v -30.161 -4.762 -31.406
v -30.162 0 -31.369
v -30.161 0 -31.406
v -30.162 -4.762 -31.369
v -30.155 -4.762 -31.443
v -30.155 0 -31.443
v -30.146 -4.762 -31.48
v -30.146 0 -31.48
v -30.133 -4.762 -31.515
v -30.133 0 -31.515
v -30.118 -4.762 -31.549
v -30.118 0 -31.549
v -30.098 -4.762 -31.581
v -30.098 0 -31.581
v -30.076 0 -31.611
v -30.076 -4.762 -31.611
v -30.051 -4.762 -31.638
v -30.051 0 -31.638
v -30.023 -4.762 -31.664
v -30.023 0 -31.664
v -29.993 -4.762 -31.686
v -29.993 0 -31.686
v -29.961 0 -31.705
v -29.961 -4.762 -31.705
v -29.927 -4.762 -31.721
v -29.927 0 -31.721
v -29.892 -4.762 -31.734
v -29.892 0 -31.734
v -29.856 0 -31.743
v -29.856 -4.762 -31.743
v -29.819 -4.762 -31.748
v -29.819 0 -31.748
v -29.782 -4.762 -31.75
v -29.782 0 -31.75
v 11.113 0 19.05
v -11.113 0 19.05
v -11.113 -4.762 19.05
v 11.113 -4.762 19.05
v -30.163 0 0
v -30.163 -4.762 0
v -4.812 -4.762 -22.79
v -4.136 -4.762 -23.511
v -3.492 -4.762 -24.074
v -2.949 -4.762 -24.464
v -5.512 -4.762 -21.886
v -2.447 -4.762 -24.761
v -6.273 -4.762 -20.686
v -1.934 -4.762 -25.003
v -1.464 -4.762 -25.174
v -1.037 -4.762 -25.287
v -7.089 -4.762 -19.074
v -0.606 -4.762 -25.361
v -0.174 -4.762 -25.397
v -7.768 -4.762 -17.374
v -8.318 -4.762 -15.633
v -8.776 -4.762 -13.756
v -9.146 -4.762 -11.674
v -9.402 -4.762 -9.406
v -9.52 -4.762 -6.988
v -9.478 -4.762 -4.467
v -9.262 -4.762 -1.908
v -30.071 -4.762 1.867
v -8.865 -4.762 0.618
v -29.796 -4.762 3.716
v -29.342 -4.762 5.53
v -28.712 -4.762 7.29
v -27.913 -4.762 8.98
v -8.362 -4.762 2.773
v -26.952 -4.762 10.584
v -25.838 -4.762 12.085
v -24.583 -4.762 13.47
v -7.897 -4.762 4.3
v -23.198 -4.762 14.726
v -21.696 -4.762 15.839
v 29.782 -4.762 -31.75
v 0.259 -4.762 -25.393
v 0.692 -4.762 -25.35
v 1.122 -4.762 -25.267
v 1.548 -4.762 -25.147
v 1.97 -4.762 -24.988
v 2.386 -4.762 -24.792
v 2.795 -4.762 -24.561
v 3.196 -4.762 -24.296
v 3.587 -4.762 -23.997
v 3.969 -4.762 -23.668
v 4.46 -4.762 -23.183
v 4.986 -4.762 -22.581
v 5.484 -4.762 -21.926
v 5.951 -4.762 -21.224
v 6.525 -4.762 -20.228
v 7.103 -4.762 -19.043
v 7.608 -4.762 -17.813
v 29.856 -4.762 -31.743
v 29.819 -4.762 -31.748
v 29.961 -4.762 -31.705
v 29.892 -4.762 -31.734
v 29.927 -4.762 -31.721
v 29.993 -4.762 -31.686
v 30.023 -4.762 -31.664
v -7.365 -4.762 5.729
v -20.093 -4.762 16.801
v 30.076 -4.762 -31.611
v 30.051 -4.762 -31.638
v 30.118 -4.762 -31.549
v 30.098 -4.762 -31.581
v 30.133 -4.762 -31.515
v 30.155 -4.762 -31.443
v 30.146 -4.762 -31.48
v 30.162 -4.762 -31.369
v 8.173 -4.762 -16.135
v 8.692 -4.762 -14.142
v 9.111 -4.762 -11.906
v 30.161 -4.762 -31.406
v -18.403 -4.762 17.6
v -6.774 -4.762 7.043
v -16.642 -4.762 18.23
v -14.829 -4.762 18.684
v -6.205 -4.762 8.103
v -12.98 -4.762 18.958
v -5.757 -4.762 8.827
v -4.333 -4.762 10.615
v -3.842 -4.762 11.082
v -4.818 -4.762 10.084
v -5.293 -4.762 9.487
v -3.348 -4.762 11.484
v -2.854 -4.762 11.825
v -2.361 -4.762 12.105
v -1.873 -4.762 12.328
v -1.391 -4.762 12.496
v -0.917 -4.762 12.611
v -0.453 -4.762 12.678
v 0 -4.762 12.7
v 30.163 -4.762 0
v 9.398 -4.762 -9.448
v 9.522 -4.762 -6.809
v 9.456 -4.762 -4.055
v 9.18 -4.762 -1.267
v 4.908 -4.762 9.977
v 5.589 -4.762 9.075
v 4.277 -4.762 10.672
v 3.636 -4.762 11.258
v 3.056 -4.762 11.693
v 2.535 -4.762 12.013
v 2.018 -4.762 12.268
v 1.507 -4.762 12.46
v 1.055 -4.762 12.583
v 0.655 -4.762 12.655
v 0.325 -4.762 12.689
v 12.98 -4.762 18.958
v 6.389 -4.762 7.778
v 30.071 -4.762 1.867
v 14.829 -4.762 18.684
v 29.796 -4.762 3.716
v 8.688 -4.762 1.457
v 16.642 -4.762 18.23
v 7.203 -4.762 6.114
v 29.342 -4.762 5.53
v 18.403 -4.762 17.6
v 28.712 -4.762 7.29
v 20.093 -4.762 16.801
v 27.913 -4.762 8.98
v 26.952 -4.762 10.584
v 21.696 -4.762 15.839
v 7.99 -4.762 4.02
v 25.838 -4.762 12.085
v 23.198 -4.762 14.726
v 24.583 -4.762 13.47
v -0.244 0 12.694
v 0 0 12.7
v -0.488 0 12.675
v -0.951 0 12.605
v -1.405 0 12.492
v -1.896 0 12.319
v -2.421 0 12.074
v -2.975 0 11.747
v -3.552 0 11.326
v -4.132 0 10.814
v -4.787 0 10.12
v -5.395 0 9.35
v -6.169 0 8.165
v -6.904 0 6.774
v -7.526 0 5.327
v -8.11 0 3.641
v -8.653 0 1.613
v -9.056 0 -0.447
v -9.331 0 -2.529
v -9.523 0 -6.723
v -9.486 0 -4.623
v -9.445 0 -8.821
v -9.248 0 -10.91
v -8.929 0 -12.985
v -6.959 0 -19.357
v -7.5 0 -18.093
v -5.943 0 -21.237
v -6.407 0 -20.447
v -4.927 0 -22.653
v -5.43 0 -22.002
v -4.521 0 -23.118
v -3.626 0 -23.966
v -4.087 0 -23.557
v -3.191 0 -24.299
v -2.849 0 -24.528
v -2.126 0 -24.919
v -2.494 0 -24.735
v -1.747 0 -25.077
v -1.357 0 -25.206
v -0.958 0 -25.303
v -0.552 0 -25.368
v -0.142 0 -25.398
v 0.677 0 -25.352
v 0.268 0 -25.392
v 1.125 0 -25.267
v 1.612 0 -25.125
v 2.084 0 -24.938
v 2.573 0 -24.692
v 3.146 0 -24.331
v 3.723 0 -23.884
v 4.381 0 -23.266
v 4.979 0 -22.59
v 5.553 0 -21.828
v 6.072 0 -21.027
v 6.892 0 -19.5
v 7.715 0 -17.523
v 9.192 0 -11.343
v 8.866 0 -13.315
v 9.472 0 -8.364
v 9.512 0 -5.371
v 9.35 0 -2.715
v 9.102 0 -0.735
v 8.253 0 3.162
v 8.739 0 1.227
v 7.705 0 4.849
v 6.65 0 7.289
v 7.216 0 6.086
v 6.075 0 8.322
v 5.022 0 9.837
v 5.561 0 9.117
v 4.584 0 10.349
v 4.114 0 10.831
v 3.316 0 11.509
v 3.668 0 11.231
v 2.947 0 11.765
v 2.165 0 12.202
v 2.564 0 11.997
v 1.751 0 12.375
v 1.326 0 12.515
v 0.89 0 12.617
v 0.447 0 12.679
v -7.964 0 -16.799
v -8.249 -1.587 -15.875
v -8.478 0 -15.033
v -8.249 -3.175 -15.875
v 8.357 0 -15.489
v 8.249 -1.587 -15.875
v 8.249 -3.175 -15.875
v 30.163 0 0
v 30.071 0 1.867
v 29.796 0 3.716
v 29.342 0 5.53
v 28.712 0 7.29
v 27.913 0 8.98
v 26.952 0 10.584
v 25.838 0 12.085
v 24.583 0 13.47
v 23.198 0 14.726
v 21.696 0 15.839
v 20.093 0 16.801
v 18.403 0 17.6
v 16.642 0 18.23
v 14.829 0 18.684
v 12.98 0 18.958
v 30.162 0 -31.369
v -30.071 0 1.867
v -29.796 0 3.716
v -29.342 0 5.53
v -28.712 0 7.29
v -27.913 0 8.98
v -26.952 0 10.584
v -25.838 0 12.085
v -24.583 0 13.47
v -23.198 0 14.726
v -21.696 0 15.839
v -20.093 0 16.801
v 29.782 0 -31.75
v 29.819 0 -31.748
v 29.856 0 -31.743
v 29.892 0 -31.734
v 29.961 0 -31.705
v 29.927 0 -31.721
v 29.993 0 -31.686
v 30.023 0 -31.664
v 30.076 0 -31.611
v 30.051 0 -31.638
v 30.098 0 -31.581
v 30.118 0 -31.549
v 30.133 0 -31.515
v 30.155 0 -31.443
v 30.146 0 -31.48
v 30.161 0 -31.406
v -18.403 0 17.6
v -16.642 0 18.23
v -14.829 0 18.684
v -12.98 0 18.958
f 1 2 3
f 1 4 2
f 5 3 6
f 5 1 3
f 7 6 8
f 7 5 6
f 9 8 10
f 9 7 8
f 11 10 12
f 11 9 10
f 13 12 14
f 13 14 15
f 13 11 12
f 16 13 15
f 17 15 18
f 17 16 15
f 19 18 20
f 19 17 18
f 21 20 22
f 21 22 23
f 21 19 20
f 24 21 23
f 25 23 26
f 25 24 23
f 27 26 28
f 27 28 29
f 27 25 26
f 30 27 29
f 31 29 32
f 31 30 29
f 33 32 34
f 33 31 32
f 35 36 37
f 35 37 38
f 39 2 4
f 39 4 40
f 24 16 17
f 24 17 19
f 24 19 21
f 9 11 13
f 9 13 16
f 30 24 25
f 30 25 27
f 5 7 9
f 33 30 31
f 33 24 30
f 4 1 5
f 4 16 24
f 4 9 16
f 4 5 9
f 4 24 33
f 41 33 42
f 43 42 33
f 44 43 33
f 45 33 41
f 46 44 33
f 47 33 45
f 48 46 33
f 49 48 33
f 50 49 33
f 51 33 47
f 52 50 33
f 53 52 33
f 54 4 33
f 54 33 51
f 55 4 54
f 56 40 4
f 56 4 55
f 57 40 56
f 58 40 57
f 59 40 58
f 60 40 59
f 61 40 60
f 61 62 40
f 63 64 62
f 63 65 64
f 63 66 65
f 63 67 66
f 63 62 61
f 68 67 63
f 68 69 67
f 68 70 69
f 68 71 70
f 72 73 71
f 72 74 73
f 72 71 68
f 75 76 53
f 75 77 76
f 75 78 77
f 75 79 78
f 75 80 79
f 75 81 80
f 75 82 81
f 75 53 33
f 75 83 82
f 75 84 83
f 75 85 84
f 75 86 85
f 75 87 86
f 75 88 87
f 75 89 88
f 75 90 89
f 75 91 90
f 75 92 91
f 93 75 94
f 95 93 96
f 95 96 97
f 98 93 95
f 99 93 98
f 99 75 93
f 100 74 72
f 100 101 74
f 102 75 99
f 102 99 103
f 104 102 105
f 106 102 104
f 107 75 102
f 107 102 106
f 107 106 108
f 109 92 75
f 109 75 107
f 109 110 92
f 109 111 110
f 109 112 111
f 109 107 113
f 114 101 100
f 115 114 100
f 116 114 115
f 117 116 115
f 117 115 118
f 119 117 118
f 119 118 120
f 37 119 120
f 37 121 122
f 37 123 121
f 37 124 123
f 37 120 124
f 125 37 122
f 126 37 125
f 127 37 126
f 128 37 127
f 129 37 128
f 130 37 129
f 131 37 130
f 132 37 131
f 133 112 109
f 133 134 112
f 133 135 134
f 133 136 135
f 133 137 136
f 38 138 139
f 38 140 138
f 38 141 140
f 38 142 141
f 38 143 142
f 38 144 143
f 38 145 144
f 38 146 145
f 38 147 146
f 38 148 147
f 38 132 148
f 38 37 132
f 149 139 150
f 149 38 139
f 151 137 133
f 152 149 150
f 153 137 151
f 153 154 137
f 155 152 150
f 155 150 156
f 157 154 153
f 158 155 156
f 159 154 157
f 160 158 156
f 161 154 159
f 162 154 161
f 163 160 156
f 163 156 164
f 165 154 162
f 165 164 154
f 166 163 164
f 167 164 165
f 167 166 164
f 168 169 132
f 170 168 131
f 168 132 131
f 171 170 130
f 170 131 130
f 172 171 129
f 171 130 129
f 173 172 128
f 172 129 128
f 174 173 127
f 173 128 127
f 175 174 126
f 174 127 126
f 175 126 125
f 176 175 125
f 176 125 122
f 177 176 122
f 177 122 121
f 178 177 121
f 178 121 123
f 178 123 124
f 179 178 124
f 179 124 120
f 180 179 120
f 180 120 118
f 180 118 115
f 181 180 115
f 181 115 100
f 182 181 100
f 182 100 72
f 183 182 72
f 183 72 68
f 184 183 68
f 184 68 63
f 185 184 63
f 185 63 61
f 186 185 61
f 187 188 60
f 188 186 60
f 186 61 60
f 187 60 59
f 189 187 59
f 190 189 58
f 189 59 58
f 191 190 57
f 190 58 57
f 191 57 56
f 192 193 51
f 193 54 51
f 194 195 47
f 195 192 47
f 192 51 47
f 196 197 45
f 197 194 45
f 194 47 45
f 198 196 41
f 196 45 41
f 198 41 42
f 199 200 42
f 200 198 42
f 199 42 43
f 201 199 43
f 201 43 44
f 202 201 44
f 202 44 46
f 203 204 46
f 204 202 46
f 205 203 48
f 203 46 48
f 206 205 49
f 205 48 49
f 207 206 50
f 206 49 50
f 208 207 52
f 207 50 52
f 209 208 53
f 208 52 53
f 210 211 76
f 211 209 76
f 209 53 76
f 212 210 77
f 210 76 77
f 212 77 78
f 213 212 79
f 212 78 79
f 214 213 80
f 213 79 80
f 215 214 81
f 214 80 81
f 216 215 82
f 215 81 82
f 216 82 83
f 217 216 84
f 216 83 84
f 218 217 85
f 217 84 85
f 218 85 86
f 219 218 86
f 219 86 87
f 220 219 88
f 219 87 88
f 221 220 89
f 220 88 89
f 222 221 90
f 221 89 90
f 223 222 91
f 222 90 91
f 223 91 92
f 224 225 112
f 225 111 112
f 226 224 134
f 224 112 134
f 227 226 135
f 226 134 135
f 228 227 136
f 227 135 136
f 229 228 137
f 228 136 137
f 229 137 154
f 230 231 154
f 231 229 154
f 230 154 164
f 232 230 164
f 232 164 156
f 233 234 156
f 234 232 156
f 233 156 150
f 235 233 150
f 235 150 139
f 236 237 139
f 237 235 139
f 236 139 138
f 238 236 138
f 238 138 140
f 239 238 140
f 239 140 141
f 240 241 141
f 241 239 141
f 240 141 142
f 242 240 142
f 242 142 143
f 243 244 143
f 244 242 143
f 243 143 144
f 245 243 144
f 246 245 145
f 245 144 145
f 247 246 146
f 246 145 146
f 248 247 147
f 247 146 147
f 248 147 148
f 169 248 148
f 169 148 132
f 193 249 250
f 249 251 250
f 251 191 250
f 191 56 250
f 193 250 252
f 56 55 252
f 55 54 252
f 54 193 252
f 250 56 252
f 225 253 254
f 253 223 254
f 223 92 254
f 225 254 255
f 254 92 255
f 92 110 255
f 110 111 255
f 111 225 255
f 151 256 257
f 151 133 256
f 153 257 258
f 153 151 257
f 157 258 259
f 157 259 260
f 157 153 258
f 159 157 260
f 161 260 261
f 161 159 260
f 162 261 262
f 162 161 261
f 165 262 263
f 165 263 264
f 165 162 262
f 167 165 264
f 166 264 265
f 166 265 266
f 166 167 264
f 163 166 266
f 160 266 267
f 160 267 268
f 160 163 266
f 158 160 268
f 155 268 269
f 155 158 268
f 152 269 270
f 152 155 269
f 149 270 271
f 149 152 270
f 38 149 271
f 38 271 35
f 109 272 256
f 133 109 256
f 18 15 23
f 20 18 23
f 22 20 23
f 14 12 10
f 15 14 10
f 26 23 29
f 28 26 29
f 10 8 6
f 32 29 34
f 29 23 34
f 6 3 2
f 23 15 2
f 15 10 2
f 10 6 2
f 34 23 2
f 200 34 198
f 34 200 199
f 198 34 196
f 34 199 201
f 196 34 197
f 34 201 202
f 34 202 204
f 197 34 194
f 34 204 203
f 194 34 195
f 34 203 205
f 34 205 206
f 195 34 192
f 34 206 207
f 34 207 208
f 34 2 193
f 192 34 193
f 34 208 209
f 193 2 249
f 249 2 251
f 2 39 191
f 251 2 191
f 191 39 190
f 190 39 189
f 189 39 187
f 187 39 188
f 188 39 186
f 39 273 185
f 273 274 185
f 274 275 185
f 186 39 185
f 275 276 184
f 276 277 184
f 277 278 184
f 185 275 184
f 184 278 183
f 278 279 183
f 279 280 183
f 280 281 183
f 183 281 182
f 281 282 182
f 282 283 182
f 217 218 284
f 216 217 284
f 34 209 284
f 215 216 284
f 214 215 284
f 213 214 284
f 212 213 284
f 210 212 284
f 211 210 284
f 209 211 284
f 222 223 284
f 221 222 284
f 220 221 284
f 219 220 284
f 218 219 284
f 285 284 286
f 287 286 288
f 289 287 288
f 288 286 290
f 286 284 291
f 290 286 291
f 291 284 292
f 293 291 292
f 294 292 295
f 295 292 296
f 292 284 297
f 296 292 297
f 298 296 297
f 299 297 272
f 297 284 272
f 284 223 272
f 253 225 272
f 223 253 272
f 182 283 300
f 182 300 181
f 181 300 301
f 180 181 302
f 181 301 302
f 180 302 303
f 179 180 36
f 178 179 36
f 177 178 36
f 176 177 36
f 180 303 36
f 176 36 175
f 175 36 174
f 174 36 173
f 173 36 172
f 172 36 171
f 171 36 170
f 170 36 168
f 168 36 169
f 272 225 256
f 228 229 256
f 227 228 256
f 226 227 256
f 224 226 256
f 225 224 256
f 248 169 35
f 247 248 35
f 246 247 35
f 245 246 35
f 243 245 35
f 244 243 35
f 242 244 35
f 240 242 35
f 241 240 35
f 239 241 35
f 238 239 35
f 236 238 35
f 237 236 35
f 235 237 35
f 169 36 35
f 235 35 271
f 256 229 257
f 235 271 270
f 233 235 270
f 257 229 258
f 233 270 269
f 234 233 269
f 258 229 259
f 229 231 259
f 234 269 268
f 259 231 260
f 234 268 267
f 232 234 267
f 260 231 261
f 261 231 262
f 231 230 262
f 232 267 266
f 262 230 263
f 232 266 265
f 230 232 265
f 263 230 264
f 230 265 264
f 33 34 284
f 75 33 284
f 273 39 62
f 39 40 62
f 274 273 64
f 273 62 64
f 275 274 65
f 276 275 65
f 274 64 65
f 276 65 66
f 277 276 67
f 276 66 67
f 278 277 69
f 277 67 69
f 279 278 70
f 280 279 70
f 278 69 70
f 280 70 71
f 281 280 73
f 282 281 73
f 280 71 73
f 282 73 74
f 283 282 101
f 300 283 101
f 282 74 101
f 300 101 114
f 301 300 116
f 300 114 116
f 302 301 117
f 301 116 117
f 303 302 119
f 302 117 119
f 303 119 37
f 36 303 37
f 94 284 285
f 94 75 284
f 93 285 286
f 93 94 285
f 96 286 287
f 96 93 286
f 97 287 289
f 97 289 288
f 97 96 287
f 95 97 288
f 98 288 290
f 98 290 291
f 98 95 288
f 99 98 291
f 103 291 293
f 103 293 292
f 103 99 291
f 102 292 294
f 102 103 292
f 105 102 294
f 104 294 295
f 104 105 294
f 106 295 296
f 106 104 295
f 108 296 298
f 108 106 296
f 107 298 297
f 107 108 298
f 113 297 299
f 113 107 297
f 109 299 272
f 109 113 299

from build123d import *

# Parameters (mm, degrees)
F0_W     = 60.325
F0_H     = 50.8
F1_DEPTH = 4.7625
F2_R     = 19.05
F3_R     = 0.381
F5_DEPTH = 25.4


with BuildPart() as f1:
    # F0 (on Front) → F1 (new body)
    with BuildSketch(Plane.XZ):
        with Locations((0, -6.35)):
            Rectangle(F0_W, F0_H)
    extrude(amount=F1_DEPTH)

    # F2
    f2_edges = [f1.edges().sort_by_distance(p)[0] for p in [
        (-30.1625, -2.38125, 19.05),
        (30.1625, -2.38125, 19.05),
    ]]
    fillet(f2_edges, radius=F2_R)

    # F3
    f3_edges = [f1.edges().sort_by_distance(p)[0] for p in [
        (-30.1625, -2.38125, -31.75),
        (30.1625, -2.38125, -31.75),
    ]]
    fillet(f3_edges, radius=F3_R)

    # F4 (on face) → F5 (cut)
    with BuildSketch(Plane.XZ.offset(4.7625)):
        with BuildLine():
            add(Edge.make_bspline(
                [(0, 12.7), (-16.497784, 12.7), (-8.248892, -15.875), (0, -44.45), (8.248892, -15.875), (16.497784, 12.7), (0, 12.7)],
                knots=[0, 0, 0, 2.094395, 2.094395, 4.18879, 4.18879, 6.283185, 6.283185, 6.283185], degree=2, weights=[1, 0.5, 1, 0.5, 1, 0.5, 1]))
        make_face()
    extrude(amount=-F5_DEPTH, mode=Mode.SUBTRACT)


solid = f1.part
